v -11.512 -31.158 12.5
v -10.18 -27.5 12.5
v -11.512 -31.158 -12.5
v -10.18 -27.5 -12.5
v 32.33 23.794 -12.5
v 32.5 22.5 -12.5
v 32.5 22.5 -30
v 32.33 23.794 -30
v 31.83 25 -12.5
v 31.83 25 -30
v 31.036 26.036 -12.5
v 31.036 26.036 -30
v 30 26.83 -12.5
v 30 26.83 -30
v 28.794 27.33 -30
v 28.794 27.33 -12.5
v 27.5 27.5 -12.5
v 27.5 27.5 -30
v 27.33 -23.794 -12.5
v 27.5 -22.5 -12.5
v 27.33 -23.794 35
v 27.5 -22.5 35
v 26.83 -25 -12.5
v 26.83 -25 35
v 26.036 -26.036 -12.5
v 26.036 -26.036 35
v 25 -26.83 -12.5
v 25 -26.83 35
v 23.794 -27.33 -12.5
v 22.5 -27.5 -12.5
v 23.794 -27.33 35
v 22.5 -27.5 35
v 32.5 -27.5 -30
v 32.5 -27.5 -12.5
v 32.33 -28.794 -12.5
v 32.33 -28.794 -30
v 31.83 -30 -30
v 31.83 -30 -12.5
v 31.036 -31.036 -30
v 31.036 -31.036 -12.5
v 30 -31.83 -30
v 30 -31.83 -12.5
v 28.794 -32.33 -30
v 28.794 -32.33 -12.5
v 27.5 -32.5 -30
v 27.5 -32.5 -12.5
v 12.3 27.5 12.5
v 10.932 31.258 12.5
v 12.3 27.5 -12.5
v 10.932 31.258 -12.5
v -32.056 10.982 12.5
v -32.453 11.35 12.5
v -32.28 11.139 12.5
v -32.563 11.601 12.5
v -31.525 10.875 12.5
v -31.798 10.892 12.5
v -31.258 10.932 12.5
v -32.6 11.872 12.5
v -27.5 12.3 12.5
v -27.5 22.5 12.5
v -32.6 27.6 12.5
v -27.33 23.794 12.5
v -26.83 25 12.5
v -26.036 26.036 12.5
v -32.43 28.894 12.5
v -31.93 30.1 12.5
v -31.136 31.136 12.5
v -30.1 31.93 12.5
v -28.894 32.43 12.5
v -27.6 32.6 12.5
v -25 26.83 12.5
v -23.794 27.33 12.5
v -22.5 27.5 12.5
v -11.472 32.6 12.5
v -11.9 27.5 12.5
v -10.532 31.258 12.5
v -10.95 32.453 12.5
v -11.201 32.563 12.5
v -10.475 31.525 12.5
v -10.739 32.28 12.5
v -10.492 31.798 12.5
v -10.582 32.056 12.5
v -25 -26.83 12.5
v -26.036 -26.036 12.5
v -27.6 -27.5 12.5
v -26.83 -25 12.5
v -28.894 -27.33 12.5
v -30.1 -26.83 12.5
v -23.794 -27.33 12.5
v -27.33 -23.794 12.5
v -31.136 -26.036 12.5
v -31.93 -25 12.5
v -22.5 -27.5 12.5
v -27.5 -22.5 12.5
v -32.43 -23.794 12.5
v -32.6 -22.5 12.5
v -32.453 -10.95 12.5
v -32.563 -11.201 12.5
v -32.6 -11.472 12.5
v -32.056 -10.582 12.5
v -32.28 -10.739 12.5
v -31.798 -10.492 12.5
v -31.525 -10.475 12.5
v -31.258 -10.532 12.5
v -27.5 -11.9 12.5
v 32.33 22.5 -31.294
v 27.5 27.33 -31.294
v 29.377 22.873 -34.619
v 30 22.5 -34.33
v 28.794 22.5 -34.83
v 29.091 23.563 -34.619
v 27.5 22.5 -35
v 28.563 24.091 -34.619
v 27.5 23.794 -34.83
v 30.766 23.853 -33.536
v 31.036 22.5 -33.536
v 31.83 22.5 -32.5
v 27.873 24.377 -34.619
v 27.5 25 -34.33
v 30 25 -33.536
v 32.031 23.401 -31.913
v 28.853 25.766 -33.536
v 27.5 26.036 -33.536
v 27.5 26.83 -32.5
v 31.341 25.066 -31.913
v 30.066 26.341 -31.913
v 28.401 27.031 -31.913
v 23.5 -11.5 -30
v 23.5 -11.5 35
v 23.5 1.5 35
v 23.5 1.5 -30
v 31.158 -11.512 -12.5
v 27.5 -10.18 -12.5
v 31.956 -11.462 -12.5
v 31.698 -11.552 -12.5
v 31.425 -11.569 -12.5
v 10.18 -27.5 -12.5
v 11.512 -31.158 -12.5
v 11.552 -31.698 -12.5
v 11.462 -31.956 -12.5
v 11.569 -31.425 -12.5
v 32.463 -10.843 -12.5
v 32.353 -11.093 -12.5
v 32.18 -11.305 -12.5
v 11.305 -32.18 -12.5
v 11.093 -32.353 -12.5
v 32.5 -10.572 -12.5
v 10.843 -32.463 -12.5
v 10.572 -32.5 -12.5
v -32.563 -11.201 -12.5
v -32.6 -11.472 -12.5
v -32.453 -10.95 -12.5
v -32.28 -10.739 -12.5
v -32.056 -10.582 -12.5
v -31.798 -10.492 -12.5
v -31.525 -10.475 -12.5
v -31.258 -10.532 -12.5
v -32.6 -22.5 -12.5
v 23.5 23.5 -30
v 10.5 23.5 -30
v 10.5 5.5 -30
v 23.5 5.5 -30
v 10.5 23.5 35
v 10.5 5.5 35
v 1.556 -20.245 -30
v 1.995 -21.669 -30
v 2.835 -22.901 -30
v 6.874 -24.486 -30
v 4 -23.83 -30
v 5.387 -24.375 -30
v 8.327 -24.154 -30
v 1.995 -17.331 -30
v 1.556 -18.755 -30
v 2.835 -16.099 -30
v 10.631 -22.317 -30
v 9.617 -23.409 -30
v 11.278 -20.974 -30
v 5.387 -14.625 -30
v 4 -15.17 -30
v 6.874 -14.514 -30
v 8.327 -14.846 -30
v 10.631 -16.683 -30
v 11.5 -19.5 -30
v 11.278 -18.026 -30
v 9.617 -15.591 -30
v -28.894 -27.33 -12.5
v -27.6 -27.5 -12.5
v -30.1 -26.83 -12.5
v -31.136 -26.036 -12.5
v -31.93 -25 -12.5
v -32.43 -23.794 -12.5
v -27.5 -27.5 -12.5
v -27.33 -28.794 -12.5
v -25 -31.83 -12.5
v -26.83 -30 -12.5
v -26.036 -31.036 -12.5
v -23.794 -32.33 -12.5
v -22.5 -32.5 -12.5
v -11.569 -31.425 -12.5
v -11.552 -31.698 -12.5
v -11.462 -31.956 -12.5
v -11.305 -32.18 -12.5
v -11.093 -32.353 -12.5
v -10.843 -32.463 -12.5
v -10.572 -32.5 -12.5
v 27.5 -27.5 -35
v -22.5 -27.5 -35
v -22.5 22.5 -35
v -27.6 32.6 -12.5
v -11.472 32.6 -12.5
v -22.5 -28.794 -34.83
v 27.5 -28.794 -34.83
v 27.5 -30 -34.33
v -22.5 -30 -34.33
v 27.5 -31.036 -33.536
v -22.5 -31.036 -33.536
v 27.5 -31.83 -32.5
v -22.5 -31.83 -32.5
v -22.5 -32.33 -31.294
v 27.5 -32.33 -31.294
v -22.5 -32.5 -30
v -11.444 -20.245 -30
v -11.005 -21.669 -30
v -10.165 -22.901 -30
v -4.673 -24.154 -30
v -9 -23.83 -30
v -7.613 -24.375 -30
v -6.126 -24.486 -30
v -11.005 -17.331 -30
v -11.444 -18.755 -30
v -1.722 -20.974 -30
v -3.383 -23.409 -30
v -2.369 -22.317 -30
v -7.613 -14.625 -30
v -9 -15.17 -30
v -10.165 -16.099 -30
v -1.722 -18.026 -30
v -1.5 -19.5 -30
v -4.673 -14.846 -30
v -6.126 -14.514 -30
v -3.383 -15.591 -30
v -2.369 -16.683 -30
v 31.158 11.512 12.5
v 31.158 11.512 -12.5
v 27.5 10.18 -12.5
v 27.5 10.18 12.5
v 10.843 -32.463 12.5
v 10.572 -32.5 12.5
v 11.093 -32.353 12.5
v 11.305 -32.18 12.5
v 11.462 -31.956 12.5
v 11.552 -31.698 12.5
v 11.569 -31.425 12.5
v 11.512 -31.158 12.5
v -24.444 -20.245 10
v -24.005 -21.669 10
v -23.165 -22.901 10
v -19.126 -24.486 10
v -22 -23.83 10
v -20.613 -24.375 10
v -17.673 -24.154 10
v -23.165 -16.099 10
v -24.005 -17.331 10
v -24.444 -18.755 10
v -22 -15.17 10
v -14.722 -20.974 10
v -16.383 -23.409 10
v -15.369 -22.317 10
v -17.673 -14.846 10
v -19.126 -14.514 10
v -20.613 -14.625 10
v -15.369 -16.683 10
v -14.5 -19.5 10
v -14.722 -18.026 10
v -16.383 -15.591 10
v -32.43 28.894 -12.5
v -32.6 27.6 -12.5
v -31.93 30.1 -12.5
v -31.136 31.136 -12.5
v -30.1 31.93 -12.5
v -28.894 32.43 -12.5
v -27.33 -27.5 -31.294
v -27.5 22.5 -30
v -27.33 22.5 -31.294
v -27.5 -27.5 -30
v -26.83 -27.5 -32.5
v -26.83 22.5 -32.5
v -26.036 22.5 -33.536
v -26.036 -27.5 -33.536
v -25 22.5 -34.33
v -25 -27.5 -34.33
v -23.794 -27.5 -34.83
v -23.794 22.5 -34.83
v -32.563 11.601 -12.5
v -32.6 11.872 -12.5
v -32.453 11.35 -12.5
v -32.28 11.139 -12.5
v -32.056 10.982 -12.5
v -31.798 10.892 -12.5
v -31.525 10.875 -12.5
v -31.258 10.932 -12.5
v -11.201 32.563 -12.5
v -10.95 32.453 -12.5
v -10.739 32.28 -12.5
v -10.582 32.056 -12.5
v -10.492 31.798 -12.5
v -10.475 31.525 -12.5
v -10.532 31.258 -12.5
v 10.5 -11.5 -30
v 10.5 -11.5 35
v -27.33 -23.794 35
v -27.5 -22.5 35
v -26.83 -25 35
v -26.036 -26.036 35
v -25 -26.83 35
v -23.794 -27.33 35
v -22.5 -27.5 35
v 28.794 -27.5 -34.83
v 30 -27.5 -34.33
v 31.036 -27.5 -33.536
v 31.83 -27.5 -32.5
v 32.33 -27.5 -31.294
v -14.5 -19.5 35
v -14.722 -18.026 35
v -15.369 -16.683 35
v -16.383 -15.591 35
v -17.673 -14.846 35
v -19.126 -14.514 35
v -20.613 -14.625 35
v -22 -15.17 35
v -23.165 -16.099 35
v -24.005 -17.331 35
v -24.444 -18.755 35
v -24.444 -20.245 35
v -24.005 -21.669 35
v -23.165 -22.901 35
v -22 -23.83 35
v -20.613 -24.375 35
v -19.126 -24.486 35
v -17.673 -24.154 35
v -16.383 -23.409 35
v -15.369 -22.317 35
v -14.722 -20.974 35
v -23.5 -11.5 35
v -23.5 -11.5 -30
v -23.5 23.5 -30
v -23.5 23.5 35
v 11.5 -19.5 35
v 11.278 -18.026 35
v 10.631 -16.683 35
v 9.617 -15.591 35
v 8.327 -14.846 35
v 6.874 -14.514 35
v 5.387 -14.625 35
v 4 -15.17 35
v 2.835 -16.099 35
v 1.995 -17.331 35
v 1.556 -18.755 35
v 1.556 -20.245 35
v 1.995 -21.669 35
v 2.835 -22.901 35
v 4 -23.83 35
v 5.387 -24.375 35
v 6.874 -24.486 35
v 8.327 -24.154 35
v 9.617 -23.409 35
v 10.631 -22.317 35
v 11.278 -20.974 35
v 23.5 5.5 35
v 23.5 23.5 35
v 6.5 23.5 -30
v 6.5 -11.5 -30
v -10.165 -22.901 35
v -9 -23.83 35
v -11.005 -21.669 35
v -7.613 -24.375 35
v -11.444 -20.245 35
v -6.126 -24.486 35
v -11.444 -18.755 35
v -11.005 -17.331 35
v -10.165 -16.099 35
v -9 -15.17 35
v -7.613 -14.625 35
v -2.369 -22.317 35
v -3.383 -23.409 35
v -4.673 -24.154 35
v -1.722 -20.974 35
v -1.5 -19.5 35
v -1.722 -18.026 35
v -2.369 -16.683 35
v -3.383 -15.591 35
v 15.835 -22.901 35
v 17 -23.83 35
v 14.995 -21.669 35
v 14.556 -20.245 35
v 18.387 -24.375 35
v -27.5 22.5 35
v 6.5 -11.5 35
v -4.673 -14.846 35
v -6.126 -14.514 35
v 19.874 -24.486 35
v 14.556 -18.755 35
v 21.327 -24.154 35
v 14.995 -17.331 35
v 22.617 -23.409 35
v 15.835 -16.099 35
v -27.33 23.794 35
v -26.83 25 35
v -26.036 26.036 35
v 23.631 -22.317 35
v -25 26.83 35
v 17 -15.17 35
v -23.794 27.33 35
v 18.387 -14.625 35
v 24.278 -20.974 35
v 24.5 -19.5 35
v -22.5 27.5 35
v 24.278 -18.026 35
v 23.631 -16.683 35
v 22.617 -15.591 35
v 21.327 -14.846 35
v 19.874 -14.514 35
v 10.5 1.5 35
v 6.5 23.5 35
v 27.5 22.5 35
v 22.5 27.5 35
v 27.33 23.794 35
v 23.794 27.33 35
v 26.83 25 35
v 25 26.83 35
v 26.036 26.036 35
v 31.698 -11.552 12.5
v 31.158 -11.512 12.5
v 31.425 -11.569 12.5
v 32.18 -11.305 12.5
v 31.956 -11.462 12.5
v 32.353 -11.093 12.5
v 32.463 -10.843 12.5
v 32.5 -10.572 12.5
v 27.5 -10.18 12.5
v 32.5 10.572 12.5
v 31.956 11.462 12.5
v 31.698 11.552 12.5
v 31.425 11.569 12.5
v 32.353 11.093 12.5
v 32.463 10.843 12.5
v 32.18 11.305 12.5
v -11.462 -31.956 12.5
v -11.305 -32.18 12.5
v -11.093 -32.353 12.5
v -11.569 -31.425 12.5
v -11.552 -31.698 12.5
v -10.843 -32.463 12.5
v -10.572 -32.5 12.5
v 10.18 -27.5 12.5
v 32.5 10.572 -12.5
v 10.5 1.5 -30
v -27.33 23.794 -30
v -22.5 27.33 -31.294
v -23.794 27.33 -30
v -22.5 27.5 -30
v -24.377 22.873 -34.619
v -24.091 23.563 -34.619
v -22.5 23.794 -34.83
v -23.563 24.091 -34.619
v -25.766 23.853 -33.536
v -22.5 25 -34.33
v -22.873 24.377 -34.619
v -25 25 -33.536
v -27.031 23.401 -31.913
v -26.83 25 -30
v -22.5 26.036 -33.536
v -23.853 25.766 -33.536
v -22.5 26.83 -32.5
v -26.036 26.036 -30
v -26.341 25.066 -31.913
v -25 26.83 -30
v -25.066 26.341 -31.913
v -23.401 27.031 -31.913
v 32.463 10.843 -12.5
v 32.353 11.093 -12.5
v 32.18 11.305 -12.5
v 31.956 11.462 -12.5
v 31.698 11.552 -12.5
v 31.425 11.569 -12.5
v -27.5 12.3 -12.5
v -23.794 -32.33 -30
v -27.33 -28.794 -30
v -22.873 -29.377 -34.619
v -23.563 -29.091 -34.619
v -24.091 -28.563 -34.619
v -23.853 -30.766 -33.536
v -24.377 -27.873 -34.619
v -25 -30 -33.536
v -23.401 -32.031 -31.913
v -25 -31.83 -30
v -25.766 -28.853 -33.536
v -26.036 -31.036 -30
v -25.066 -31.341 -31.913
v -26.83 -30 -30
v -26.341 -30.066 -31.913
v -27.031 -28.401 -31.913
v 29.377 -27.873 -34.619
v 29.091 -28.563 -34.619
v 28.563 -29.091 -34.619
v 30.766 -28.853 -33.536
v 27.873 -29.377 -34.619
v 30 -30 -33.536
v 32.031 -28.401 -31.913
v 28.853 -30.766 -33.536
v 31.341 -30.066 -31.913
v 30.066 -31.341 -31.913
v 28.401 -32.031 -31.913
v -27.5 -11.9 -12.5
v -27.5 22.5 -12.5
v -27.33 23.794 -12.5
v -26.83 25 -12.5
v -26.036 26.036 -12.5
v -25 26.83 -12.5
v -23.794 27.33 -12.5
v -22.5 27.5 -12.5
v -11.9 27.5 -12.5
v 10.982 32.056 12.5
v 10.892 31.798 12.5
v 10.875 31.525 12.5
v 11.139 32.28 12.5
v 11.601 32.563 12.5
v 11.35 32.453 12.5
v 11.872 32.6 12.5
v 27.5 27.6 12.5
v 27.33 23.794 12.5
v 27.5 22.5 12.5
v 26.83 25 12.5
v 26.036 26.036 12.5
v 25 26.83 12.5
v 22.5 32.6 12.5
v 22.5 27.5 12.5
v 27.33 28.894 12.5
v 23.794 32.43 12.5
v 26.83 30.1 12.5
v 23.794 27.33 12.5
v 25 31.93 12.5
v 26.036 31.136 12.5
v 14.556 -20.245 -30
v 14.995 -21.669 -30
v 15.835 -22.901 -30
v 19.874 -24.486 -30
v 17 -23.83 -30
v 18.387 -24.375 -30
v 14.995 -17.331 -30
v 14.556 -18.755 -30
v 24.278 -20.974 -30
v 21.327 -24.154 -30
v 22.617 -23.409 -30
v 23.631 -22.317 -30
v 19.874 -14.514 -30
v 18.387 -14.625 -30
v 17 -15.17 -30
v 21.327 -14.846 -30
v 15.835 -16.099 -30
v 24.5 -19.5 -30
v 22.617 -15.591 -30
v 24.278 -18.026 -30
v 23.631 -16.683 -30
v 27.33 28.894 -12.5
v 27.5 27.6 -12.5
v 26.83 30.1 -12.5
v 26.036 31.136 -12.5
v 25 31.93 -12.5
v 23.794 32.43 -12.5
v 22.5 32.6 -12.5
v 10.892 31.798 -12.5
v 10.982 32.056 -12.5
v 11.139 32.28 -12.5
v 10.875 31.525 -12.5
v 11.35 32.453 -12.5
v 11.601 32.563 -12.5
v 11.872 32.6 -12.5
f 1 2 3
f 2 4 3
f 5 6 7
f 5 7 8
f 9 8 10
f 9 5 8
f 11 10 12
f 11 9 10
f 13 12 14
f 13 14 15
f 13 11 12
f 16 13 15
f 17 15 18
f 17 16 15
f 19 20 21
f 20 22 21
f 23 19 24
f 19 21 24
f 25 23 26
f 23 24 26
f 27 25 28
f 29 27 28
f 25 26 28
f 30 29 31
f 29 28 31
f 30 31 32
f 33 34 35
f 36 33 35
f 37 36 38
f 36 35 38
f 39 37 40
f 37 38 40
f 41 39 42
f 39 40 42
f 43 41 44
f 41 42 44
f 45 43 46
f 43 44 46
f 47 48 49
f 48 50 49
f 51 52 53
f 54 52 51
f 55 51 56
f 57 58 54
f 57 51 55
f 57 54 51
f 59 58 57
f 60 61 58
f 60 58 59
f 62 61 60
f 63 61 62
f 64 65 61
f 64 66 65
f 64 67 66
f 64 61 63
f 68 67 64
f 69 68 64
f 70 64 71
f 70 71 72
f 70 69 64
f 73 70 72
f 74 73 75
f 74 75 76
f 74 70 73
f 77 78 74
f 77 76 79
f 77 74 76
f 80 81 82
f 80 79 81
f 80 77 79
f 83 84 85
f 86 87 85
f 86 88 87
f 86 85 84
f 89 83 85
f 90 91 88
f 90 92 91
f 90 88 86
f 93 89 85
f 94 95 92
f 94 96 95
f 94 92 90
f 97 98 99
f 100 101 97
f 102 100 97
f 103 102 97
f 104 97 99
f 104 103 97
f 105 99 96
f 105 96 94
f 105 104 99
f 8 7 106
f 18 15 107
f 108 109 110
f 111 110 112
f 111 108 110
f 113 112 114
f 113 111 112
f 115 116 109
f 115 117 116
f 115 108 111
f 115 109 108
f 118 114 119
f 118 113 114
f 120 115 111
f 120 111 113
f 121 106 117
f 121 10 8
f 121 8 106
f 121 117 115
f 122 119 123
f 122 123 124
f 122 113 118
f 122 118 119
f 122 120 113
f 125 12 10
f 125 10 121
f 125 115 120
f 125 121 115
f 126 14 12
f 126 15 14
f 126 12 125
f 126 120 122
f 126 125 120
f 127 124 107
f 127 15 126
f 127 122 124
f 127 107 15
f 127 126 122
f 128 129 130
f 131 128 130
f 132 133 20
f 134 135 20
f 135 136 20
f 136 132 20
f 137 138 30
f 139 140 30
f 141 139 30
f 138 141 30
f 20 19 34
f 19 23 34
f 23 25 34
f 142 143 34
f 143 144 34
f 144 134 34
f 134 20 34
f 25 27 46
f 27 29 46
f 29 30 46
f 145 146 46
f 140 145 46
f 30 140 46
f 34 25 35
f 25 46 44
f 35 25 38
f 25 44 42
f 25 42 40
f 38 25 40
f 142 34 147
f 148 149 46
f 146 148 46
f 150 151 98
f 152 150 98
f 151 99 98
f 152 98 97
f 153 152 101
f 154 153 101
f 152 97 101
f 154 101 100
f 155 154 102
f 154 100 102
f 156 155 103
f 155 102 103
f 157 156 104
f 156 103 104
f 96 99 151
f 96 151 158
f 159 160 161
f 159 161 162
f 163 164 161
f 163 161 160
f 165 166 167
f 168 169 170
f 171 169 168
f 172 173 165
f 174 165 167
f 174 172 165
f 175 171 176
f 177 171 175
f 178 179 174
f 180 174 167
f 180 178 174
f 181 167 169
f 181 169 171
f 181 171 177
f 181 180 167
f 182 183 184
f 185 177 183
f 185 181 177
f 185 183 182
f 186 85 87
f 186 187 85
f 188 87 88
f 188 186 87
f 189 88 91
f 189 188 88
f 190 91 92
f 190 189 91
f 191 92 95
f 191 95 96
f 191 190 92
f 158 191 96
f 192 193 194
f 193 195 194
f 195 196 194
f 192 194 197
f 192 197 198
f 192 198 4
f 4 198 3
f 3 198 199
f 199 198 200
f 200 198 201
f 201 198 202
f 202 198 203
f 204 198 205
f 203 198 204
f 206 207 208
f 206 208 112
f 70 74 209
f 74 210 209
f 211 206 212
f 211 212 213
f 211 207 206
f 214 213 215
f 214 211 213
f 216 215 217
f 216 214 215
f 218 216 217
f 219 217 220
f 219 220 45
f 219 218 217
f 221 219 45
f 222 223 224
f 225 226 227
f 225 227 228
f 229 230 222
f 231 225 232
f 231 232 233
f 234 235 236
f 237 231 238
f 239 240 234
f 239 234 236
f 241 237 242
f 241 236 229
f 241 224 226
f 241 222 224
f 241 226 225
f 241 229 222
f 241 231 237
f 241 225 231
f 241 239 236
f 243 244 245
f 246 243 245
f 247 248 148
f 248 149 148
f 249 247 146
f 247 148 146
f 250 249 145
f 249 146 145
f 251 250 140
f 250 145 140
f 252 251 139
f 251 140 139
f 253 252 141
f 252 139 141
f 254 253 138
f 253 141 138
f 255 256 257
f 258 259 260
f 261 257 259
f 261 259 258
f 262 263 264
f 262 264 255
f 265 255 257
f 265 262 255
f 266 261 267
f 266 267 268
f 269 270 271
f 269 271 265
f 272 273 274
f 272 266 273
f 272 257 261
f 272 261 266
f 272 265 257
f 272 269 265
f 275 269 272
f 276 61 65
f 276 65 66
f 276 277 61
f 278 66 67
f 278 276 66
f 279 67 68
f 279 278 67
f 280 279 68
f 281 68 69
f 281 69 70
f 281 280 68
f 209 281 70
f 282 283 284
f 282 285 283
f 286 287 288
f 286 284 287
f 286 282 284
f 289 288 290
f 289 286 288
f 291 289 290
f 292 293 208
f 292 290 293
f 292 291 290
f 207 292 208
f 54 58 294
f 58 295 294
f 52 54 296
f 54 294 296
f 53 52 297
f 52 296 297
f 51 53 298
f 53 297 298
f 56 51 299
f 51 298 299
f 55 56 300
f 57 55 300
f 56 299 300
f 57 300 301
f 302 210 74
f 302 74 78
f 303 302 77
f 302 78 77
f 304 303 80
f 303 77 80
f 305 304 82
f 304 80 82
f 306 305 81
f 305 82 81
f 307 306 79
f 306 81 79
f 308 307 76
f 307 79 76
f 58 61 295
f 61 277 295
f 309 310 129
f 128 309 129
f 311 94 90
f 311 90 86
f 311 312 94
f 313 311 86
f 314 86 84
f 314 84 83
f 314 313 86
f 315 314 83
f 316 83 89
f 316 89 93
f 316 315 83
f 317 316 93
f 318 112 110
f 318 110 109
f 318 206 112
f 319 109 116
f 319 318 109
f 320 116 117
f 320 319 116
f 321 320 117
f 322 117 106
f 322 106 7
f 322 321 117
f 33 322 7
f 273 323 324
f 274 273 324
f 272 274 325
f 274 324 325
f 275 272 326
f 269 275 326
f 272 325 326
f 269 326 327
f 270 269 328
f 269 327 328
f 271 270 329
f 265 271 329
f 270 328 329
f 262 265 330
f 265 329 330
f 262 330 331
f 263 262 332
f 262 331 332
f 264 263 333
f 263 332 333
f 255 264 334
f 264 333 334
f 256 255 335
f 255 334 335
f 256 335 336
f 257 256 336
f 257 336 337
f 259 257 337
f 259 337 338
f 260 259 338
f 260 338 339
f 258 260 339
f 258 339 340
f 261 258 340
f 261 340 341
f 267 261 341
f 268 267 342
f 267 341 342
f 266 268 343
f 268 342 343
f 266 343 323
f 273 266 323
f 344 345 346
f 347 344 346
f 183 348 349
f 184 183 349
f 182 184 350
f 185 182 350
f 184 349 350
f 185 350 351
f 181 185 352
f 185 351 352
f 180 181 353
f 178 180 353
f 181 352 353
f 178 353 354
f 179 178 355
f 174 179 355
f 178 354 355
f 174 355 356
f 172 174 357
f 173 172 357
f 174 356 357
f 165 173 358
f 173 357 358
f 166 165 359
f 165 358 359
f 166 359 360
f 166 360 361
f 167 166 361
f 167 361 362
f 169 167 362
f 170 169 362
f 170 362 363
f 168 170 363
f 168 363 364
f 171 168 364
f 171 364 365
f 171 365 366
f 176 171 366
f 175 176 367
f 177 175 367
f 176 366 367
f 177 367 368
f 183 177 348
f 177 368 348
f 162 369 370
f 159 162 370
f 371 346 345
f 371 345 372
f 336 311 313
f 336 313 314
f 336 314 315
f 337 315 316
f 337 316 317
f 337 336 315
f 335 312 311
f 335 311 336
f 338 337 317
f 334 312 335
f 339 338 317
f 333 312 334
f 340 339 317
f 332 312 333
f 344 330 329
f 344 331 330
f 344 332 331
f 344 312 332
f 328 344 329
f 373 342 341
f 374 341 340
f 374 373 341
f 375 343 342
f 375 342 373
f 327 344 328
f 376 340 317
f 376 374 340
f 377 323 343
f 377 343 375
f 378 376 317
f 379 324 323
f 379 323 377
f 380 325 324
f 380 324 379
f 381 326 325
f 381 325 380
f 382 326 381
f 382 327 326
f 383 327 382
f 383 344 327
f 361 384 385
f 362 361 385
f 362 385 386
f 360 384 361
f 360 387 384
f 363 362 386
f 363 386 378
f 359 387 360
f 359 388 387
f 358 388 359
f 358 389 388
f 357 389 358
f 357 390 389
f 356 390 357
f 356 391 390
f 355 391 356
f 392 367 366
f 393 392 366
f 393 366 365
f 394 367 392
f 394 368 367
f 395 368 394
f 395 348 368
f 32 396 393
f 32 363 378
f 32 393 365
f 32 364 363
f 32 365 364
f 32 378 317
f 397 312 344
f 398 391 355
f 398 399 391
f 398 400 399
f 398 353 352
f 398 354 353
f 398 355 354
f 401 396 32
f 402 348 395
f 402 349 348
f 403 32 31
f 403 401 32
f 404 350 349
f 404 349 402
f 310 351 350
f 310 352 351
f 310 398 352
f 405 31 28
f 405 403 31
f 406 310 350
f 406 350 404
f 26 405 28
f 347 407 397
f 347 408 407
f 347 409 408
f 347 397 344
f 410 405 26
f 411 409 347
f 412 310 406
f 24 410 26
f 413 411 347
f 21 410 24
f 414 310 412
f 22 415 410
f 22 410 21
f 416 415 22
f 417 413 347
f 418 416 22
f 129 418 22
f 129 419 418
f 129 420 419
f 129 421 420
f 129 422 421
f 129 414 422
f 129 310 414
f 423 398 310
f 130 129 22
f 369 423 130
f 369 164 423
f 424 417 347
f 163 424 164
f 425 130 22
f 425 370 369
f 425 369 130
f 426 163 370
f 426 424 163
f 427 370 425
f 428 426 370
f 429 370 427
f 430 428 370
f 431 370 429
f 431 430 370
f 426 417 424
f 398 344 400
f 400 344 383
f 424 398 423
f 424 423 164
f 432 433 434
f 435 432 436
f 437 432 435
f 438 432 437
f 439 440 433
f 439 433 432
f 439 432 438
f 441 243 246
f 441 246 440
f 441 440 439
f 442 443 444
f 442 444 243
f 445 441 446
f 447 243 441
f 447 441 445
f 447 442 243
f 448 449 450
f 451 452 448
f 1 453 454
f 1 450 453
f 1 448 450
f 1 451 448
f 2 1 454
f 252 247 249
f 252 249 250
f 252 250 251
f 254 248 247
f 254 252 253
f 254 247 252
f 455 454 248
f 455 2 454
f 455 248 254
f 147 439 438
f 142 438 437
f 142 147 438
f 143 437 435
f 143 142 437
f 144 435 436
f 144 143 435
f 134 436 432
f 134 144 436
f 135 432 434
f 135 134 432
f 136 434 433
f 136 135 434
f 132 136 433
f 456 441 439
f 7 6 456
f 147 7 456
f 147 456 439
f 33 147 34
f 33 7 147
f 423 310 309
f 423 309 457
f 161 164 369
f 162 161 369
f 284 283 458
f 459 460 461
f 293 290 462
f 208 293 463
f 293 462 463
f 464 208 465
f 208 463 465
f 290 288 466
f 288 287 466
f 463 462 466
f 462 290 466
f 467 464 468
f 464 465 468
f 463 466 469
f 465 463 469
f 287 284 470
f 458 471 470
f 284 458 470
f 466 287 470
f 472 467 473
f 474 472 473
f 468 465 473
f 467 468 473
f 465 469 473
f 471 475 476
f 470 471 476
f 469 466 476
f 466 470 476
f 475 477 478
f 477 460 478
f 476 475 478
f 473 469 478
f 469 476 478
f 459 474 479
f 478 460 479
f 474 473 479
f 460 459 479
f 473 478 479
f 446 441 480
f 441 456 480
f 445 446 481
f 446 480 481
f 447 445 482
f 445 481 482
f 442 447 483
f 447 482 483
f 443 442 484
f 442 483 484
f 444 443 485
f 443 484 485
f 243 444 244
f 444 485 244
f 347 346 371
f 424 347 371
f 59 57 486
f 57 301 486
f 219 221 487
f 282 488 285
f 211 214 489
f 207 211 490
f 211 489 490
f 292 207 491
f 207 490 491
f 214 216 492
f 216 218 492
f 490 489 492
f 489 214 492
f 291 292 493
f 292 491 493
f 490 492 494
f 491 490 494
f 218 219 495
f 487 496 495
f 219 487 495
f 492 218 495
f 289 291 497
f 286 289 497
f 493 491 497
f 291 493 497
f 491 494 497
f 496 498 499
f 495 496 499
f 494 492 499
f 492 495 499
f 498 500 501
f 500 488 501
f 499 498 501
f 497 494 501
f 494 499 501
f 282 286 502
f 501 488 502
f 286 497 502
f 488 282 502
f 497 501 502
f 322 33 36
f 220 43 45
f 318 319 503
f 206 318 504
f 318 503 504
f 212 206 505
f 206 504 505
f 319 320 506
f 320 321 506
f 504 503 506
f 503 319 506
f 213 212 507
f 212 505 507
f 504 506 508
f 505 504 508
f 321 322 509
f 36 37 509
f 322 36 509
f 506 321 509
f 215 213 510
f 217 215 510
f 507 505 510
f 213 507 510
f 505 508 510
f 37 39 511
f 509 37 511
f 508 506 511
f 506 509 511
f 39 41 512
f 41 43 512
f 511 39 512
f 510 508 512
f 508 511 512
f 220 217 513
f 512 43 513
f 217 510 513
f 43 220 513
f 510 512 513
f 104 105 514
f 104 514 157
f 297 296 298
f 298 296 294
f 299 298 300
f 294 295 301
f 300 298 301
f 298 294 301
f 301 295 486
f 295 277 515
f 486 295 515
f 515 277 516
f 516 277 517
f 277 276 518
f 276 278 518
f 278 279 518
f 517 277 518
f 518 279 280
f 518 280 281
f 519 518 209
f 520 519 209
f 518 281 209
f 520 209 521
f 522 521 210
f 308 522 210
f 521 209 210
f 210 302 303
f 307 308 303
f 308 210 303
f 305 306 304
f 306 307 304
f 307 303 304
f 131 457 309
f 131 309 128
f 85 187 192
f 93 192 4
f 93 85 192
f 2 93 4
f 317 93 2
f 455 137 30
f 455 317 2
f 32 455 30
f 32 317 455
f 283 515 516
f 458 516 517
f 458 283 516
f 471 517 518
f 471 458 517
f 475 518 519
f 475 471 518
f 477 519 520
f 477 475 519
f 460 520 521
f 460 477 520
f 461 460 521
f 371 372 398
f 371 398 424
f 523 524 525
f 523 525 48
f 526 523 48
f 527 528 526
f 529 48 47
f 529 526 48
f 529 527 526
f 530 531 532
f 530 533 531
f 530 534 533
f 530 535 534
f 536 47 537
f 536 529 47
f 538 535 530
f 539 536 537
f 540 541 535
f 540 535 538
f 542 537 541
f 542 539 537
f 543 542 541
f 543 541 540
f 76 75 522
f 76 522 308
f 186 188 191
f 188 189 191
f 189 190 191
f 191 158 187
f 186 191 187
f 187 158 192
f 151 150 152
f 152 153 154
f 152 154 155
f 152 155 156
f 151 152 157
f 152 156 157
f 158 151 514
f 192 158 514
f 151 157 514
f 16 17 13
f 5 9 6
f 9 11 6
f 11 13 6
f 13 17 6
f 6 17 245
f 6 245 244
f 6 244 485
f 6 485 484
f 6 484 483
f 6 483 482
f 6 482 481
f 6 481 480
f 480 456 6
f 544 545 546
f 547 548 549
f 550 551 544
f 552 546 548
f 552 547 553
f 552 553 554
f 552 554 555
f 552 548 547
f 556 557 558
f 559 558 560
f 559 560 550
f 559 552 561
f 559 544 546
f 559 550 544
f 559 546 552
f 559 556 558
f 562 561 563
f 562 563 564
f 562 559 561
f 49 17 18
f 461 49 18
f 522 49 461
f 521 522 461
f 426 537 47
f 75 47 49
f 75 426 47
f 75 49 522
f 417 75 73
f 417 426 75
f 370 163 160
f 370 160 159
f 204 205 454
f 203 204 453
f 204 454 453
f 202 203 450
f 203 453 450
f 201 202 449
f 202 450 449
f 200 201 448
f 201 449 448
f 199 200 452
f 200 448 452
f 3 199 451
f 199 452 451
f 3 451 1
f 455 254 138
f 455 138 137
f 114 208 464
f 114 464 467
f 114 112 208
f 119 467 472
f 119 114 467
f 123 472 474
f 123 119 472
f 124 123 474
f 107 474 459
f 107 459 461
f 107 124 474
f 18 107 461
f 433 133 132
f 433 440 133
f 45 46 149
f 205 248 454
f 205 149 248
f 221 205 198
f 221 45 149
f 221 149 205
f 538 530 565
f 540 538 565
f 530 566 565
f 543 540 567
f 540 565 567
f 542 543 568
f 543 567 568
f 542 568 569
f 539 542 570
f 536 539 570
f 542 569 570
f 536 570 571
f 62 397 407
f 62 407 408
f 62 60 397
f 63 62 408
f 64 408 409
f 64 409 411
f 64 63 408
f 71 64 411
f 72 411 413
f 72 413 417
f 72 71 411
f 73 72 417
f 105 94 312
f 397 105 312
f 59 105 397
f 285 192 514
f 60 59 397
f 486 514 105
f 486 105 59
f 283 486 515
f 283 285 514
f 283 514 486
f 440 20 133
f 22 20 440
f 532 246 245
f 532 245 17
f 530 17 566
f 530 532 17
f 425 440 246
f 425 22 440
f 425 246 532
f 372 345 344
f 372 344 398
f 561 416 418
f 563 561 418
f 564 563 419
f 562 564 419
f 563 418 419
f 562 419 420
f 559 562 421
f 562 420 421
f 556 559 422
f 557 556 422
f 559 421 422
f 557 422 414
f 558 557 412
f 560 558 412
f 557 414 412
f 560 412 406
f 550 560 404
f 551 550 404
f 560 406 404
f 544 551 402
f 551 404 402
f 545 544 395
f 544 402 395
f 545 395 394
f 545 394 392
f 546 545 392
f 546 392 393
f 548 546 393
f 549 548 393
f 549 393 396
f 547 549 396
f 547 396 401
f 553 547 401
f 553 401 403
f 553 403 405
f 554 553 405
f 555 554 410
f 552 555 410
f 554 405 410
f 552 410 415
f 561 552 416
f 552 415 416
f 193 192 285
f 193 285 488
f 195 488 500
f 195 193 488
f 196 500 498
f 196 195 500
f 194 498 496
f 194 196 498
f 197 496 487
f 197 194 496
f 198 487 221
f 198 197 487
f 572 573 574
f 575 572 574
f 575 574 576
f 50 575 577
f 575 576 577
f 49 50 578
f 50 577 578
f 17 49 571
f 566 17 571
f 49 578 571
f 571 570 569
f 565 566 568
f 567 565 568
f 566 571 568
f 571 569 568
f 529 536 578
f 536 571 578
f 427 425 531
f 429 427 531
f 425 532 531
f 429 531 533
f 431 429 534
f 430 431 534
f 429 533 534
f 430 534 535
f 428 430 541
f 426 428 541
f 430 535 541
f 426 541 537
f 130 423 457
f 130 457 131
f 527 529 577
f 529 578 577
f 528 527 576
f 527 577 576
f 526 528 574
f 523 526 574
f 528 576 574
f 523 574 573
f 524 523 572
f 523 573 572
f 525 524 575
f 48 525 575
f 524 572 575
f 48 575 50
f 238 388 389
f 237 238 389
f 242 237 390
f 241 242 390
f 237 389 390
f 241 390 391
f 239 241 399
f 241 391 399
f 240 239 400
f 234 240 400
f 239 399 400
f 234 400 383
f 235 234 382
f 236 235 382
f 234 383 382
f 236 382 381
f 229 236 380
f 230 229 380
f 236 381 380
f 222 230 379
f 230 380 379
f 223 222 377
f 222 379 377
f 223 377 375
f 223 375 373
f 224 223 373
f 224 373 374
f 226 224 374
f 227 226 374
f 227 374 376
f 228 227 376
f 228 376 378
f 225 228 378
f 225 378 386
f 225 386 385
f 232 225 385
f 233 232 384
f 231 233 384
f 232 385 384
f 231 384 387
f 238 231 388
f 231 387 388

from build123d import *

# Parameters (mm, degrees)
F1_DEPTH = 35
F0_W     = 5.1
F0_H     = 5.1
F2_DEPTH = 12.5
F4_DEPTH = 22.5
F5_R     = 5
F6_R     = 1
F7_W     = 30
F7_H     = 35
F7_R     = 5
F7_W_2   = 13
F7_H_2   = 18
F7_H_3   = 13
F8_DEPTH = 65
F9_DEPTH = 25


with BuildPart() as f1:
    # F0 (on Top) → F1 (new body, symmetric)
    with BuildSketch(Plane.XY):
        Polygon((-11.9, 27.5), (-27.5, 27.5), (-27.5, 12.3), (-27.5, -11.9), (-27.5, -27.5), (-10.1801488287, -27.5), (10.1801488287, -27.5), (27.5, -27.5), (27.5, -10.1801488287), (27.5, 10.1801488287), (27.5, 27.5), (12.3, 27.5), align=None)
    extrude(amount=F1_DEPTH, both=True)

    # F0 (on Top) → F2 (join, symmetric)
    with BuildSketch(Plane.XY):
        Polygon((-27.5, 12.3), (-27.5, 27.5), (-32.6, 27.5), (-32.6, 10.4437518052), align=None)
        Polygon((-27.5, -27.5), (-27.5, -11.9), (-32.6, -10.0437518052), (-32.6, -27.5), align=None)
        Polygon((-27.5, 32.6), (-27.5, 27.5), (-11.9, 27.5), (-10.0437518052, 32.6), align=None)
        Polygon((10.4437518052, 32.6), (12.3, 27.5), (27.5, 27.5), (27.5, 32.6), align=None)
        Polygon((10.1801488287, -27.5), (-10.1801488287, -27.5), (-12, -32.5), (12, -32.5), align=None)
        Polygon((32.5, 12), (27.5, 10.1801488287), (27.5, -10.1801488287), (32.5, -12), align=None)
        with Locations((-30.05, 30.05)):
            Rectangle(F0_W, F0_H)
    extrude(amount=F2_DEPTH, both=True)

    # F3 (on face) → F4 (join, through all)
    with BuildSketch(Plane(origin=(0, 0, -35), x_dir=(1, 0, 0), z_dir=(0, 0, -1))):
        Polygon((-27.5, 32.5), (-27.5, 27.5), (27.5, 27.5), (27.5, -27.5), (32.5, -27.5), (32.5, 32.5), align=None)
    extrude(amount=-F4_DEPTH)

    # F5
    f5_edges = [f1.edges().sort_by_distance(p)[0] for p in [
        (-32.6, 32.6, 0),
        (-27.5, 27.5, 23.75),
        (-27.5, 27.5, -23.75),
        (-32.6, -27.5, 0),
        (-27.5, -32.5, -23.75),
        (32.5, -32.5, -23.75),
        (27.5, -27.5, 11.25),
        (32.5, 27.5, -23.75),
        (27.5, 32.6, 0),
        (27.5, 27.5, 23.75),
        (32.5, -2.5, -35),
        (2.5, -32.5, -35),
        (-27.5, -2.5, -35),
        (2.5, 27.5, -35),
        (-27.5, -27.5, 23.75),
    ]]
    fillet(f5_edges, radius=F5_R)

    # F6
    f6_edges = [f1.edges().sort_by_distance(p)[0] for p in [
        (12, -32.5, 0),
        (-12, -32.5, 0),
        (32.5, -12, 0),
        (32.5, 12, 0),
        (10.443752, 32.6, 0),
        (-10.043752, 32.6, 0),
        (-32.6, 10.443752, 0),
        (-32.6, -10.043752, 0),
    ]]
    fillet(f6_edges, radius=F6_R)

    # F7 (on face) → F8 (cut)
    with BuildSketch(Plane.XY.offset(35)):
        with Locations((-8.5, 6)):
            Rectangle(F7_W, F7_H)
        with Locations((-6.5, -19.5)):
            Circle(F7_R)
        with Locations((6.5, -19.5)):
            Circle(F7_R)
        with Locations((17, 14.5)):
            Rectangle(F7_W_2, F7_H_2)
        with Locations((17, -5)):
            Rectangle(F7_W_2, F7_H_3)
        with Locations((19.5, -19.5)):
            Circle(F7_R)
    extrude(amount=-F8_DEPTH, mode=Mode.SUBTRACT)

    # F7 (on face) → F9 (cut)
    with BuildSketch(Plane.XY.offset(35)):
        with Locations((-19.5, -19.5)):
            Circle(F7_R)
    extrude(amount=-F9_DEPTH, mode=Mode.SUBTRACT)


solid = f1.part
